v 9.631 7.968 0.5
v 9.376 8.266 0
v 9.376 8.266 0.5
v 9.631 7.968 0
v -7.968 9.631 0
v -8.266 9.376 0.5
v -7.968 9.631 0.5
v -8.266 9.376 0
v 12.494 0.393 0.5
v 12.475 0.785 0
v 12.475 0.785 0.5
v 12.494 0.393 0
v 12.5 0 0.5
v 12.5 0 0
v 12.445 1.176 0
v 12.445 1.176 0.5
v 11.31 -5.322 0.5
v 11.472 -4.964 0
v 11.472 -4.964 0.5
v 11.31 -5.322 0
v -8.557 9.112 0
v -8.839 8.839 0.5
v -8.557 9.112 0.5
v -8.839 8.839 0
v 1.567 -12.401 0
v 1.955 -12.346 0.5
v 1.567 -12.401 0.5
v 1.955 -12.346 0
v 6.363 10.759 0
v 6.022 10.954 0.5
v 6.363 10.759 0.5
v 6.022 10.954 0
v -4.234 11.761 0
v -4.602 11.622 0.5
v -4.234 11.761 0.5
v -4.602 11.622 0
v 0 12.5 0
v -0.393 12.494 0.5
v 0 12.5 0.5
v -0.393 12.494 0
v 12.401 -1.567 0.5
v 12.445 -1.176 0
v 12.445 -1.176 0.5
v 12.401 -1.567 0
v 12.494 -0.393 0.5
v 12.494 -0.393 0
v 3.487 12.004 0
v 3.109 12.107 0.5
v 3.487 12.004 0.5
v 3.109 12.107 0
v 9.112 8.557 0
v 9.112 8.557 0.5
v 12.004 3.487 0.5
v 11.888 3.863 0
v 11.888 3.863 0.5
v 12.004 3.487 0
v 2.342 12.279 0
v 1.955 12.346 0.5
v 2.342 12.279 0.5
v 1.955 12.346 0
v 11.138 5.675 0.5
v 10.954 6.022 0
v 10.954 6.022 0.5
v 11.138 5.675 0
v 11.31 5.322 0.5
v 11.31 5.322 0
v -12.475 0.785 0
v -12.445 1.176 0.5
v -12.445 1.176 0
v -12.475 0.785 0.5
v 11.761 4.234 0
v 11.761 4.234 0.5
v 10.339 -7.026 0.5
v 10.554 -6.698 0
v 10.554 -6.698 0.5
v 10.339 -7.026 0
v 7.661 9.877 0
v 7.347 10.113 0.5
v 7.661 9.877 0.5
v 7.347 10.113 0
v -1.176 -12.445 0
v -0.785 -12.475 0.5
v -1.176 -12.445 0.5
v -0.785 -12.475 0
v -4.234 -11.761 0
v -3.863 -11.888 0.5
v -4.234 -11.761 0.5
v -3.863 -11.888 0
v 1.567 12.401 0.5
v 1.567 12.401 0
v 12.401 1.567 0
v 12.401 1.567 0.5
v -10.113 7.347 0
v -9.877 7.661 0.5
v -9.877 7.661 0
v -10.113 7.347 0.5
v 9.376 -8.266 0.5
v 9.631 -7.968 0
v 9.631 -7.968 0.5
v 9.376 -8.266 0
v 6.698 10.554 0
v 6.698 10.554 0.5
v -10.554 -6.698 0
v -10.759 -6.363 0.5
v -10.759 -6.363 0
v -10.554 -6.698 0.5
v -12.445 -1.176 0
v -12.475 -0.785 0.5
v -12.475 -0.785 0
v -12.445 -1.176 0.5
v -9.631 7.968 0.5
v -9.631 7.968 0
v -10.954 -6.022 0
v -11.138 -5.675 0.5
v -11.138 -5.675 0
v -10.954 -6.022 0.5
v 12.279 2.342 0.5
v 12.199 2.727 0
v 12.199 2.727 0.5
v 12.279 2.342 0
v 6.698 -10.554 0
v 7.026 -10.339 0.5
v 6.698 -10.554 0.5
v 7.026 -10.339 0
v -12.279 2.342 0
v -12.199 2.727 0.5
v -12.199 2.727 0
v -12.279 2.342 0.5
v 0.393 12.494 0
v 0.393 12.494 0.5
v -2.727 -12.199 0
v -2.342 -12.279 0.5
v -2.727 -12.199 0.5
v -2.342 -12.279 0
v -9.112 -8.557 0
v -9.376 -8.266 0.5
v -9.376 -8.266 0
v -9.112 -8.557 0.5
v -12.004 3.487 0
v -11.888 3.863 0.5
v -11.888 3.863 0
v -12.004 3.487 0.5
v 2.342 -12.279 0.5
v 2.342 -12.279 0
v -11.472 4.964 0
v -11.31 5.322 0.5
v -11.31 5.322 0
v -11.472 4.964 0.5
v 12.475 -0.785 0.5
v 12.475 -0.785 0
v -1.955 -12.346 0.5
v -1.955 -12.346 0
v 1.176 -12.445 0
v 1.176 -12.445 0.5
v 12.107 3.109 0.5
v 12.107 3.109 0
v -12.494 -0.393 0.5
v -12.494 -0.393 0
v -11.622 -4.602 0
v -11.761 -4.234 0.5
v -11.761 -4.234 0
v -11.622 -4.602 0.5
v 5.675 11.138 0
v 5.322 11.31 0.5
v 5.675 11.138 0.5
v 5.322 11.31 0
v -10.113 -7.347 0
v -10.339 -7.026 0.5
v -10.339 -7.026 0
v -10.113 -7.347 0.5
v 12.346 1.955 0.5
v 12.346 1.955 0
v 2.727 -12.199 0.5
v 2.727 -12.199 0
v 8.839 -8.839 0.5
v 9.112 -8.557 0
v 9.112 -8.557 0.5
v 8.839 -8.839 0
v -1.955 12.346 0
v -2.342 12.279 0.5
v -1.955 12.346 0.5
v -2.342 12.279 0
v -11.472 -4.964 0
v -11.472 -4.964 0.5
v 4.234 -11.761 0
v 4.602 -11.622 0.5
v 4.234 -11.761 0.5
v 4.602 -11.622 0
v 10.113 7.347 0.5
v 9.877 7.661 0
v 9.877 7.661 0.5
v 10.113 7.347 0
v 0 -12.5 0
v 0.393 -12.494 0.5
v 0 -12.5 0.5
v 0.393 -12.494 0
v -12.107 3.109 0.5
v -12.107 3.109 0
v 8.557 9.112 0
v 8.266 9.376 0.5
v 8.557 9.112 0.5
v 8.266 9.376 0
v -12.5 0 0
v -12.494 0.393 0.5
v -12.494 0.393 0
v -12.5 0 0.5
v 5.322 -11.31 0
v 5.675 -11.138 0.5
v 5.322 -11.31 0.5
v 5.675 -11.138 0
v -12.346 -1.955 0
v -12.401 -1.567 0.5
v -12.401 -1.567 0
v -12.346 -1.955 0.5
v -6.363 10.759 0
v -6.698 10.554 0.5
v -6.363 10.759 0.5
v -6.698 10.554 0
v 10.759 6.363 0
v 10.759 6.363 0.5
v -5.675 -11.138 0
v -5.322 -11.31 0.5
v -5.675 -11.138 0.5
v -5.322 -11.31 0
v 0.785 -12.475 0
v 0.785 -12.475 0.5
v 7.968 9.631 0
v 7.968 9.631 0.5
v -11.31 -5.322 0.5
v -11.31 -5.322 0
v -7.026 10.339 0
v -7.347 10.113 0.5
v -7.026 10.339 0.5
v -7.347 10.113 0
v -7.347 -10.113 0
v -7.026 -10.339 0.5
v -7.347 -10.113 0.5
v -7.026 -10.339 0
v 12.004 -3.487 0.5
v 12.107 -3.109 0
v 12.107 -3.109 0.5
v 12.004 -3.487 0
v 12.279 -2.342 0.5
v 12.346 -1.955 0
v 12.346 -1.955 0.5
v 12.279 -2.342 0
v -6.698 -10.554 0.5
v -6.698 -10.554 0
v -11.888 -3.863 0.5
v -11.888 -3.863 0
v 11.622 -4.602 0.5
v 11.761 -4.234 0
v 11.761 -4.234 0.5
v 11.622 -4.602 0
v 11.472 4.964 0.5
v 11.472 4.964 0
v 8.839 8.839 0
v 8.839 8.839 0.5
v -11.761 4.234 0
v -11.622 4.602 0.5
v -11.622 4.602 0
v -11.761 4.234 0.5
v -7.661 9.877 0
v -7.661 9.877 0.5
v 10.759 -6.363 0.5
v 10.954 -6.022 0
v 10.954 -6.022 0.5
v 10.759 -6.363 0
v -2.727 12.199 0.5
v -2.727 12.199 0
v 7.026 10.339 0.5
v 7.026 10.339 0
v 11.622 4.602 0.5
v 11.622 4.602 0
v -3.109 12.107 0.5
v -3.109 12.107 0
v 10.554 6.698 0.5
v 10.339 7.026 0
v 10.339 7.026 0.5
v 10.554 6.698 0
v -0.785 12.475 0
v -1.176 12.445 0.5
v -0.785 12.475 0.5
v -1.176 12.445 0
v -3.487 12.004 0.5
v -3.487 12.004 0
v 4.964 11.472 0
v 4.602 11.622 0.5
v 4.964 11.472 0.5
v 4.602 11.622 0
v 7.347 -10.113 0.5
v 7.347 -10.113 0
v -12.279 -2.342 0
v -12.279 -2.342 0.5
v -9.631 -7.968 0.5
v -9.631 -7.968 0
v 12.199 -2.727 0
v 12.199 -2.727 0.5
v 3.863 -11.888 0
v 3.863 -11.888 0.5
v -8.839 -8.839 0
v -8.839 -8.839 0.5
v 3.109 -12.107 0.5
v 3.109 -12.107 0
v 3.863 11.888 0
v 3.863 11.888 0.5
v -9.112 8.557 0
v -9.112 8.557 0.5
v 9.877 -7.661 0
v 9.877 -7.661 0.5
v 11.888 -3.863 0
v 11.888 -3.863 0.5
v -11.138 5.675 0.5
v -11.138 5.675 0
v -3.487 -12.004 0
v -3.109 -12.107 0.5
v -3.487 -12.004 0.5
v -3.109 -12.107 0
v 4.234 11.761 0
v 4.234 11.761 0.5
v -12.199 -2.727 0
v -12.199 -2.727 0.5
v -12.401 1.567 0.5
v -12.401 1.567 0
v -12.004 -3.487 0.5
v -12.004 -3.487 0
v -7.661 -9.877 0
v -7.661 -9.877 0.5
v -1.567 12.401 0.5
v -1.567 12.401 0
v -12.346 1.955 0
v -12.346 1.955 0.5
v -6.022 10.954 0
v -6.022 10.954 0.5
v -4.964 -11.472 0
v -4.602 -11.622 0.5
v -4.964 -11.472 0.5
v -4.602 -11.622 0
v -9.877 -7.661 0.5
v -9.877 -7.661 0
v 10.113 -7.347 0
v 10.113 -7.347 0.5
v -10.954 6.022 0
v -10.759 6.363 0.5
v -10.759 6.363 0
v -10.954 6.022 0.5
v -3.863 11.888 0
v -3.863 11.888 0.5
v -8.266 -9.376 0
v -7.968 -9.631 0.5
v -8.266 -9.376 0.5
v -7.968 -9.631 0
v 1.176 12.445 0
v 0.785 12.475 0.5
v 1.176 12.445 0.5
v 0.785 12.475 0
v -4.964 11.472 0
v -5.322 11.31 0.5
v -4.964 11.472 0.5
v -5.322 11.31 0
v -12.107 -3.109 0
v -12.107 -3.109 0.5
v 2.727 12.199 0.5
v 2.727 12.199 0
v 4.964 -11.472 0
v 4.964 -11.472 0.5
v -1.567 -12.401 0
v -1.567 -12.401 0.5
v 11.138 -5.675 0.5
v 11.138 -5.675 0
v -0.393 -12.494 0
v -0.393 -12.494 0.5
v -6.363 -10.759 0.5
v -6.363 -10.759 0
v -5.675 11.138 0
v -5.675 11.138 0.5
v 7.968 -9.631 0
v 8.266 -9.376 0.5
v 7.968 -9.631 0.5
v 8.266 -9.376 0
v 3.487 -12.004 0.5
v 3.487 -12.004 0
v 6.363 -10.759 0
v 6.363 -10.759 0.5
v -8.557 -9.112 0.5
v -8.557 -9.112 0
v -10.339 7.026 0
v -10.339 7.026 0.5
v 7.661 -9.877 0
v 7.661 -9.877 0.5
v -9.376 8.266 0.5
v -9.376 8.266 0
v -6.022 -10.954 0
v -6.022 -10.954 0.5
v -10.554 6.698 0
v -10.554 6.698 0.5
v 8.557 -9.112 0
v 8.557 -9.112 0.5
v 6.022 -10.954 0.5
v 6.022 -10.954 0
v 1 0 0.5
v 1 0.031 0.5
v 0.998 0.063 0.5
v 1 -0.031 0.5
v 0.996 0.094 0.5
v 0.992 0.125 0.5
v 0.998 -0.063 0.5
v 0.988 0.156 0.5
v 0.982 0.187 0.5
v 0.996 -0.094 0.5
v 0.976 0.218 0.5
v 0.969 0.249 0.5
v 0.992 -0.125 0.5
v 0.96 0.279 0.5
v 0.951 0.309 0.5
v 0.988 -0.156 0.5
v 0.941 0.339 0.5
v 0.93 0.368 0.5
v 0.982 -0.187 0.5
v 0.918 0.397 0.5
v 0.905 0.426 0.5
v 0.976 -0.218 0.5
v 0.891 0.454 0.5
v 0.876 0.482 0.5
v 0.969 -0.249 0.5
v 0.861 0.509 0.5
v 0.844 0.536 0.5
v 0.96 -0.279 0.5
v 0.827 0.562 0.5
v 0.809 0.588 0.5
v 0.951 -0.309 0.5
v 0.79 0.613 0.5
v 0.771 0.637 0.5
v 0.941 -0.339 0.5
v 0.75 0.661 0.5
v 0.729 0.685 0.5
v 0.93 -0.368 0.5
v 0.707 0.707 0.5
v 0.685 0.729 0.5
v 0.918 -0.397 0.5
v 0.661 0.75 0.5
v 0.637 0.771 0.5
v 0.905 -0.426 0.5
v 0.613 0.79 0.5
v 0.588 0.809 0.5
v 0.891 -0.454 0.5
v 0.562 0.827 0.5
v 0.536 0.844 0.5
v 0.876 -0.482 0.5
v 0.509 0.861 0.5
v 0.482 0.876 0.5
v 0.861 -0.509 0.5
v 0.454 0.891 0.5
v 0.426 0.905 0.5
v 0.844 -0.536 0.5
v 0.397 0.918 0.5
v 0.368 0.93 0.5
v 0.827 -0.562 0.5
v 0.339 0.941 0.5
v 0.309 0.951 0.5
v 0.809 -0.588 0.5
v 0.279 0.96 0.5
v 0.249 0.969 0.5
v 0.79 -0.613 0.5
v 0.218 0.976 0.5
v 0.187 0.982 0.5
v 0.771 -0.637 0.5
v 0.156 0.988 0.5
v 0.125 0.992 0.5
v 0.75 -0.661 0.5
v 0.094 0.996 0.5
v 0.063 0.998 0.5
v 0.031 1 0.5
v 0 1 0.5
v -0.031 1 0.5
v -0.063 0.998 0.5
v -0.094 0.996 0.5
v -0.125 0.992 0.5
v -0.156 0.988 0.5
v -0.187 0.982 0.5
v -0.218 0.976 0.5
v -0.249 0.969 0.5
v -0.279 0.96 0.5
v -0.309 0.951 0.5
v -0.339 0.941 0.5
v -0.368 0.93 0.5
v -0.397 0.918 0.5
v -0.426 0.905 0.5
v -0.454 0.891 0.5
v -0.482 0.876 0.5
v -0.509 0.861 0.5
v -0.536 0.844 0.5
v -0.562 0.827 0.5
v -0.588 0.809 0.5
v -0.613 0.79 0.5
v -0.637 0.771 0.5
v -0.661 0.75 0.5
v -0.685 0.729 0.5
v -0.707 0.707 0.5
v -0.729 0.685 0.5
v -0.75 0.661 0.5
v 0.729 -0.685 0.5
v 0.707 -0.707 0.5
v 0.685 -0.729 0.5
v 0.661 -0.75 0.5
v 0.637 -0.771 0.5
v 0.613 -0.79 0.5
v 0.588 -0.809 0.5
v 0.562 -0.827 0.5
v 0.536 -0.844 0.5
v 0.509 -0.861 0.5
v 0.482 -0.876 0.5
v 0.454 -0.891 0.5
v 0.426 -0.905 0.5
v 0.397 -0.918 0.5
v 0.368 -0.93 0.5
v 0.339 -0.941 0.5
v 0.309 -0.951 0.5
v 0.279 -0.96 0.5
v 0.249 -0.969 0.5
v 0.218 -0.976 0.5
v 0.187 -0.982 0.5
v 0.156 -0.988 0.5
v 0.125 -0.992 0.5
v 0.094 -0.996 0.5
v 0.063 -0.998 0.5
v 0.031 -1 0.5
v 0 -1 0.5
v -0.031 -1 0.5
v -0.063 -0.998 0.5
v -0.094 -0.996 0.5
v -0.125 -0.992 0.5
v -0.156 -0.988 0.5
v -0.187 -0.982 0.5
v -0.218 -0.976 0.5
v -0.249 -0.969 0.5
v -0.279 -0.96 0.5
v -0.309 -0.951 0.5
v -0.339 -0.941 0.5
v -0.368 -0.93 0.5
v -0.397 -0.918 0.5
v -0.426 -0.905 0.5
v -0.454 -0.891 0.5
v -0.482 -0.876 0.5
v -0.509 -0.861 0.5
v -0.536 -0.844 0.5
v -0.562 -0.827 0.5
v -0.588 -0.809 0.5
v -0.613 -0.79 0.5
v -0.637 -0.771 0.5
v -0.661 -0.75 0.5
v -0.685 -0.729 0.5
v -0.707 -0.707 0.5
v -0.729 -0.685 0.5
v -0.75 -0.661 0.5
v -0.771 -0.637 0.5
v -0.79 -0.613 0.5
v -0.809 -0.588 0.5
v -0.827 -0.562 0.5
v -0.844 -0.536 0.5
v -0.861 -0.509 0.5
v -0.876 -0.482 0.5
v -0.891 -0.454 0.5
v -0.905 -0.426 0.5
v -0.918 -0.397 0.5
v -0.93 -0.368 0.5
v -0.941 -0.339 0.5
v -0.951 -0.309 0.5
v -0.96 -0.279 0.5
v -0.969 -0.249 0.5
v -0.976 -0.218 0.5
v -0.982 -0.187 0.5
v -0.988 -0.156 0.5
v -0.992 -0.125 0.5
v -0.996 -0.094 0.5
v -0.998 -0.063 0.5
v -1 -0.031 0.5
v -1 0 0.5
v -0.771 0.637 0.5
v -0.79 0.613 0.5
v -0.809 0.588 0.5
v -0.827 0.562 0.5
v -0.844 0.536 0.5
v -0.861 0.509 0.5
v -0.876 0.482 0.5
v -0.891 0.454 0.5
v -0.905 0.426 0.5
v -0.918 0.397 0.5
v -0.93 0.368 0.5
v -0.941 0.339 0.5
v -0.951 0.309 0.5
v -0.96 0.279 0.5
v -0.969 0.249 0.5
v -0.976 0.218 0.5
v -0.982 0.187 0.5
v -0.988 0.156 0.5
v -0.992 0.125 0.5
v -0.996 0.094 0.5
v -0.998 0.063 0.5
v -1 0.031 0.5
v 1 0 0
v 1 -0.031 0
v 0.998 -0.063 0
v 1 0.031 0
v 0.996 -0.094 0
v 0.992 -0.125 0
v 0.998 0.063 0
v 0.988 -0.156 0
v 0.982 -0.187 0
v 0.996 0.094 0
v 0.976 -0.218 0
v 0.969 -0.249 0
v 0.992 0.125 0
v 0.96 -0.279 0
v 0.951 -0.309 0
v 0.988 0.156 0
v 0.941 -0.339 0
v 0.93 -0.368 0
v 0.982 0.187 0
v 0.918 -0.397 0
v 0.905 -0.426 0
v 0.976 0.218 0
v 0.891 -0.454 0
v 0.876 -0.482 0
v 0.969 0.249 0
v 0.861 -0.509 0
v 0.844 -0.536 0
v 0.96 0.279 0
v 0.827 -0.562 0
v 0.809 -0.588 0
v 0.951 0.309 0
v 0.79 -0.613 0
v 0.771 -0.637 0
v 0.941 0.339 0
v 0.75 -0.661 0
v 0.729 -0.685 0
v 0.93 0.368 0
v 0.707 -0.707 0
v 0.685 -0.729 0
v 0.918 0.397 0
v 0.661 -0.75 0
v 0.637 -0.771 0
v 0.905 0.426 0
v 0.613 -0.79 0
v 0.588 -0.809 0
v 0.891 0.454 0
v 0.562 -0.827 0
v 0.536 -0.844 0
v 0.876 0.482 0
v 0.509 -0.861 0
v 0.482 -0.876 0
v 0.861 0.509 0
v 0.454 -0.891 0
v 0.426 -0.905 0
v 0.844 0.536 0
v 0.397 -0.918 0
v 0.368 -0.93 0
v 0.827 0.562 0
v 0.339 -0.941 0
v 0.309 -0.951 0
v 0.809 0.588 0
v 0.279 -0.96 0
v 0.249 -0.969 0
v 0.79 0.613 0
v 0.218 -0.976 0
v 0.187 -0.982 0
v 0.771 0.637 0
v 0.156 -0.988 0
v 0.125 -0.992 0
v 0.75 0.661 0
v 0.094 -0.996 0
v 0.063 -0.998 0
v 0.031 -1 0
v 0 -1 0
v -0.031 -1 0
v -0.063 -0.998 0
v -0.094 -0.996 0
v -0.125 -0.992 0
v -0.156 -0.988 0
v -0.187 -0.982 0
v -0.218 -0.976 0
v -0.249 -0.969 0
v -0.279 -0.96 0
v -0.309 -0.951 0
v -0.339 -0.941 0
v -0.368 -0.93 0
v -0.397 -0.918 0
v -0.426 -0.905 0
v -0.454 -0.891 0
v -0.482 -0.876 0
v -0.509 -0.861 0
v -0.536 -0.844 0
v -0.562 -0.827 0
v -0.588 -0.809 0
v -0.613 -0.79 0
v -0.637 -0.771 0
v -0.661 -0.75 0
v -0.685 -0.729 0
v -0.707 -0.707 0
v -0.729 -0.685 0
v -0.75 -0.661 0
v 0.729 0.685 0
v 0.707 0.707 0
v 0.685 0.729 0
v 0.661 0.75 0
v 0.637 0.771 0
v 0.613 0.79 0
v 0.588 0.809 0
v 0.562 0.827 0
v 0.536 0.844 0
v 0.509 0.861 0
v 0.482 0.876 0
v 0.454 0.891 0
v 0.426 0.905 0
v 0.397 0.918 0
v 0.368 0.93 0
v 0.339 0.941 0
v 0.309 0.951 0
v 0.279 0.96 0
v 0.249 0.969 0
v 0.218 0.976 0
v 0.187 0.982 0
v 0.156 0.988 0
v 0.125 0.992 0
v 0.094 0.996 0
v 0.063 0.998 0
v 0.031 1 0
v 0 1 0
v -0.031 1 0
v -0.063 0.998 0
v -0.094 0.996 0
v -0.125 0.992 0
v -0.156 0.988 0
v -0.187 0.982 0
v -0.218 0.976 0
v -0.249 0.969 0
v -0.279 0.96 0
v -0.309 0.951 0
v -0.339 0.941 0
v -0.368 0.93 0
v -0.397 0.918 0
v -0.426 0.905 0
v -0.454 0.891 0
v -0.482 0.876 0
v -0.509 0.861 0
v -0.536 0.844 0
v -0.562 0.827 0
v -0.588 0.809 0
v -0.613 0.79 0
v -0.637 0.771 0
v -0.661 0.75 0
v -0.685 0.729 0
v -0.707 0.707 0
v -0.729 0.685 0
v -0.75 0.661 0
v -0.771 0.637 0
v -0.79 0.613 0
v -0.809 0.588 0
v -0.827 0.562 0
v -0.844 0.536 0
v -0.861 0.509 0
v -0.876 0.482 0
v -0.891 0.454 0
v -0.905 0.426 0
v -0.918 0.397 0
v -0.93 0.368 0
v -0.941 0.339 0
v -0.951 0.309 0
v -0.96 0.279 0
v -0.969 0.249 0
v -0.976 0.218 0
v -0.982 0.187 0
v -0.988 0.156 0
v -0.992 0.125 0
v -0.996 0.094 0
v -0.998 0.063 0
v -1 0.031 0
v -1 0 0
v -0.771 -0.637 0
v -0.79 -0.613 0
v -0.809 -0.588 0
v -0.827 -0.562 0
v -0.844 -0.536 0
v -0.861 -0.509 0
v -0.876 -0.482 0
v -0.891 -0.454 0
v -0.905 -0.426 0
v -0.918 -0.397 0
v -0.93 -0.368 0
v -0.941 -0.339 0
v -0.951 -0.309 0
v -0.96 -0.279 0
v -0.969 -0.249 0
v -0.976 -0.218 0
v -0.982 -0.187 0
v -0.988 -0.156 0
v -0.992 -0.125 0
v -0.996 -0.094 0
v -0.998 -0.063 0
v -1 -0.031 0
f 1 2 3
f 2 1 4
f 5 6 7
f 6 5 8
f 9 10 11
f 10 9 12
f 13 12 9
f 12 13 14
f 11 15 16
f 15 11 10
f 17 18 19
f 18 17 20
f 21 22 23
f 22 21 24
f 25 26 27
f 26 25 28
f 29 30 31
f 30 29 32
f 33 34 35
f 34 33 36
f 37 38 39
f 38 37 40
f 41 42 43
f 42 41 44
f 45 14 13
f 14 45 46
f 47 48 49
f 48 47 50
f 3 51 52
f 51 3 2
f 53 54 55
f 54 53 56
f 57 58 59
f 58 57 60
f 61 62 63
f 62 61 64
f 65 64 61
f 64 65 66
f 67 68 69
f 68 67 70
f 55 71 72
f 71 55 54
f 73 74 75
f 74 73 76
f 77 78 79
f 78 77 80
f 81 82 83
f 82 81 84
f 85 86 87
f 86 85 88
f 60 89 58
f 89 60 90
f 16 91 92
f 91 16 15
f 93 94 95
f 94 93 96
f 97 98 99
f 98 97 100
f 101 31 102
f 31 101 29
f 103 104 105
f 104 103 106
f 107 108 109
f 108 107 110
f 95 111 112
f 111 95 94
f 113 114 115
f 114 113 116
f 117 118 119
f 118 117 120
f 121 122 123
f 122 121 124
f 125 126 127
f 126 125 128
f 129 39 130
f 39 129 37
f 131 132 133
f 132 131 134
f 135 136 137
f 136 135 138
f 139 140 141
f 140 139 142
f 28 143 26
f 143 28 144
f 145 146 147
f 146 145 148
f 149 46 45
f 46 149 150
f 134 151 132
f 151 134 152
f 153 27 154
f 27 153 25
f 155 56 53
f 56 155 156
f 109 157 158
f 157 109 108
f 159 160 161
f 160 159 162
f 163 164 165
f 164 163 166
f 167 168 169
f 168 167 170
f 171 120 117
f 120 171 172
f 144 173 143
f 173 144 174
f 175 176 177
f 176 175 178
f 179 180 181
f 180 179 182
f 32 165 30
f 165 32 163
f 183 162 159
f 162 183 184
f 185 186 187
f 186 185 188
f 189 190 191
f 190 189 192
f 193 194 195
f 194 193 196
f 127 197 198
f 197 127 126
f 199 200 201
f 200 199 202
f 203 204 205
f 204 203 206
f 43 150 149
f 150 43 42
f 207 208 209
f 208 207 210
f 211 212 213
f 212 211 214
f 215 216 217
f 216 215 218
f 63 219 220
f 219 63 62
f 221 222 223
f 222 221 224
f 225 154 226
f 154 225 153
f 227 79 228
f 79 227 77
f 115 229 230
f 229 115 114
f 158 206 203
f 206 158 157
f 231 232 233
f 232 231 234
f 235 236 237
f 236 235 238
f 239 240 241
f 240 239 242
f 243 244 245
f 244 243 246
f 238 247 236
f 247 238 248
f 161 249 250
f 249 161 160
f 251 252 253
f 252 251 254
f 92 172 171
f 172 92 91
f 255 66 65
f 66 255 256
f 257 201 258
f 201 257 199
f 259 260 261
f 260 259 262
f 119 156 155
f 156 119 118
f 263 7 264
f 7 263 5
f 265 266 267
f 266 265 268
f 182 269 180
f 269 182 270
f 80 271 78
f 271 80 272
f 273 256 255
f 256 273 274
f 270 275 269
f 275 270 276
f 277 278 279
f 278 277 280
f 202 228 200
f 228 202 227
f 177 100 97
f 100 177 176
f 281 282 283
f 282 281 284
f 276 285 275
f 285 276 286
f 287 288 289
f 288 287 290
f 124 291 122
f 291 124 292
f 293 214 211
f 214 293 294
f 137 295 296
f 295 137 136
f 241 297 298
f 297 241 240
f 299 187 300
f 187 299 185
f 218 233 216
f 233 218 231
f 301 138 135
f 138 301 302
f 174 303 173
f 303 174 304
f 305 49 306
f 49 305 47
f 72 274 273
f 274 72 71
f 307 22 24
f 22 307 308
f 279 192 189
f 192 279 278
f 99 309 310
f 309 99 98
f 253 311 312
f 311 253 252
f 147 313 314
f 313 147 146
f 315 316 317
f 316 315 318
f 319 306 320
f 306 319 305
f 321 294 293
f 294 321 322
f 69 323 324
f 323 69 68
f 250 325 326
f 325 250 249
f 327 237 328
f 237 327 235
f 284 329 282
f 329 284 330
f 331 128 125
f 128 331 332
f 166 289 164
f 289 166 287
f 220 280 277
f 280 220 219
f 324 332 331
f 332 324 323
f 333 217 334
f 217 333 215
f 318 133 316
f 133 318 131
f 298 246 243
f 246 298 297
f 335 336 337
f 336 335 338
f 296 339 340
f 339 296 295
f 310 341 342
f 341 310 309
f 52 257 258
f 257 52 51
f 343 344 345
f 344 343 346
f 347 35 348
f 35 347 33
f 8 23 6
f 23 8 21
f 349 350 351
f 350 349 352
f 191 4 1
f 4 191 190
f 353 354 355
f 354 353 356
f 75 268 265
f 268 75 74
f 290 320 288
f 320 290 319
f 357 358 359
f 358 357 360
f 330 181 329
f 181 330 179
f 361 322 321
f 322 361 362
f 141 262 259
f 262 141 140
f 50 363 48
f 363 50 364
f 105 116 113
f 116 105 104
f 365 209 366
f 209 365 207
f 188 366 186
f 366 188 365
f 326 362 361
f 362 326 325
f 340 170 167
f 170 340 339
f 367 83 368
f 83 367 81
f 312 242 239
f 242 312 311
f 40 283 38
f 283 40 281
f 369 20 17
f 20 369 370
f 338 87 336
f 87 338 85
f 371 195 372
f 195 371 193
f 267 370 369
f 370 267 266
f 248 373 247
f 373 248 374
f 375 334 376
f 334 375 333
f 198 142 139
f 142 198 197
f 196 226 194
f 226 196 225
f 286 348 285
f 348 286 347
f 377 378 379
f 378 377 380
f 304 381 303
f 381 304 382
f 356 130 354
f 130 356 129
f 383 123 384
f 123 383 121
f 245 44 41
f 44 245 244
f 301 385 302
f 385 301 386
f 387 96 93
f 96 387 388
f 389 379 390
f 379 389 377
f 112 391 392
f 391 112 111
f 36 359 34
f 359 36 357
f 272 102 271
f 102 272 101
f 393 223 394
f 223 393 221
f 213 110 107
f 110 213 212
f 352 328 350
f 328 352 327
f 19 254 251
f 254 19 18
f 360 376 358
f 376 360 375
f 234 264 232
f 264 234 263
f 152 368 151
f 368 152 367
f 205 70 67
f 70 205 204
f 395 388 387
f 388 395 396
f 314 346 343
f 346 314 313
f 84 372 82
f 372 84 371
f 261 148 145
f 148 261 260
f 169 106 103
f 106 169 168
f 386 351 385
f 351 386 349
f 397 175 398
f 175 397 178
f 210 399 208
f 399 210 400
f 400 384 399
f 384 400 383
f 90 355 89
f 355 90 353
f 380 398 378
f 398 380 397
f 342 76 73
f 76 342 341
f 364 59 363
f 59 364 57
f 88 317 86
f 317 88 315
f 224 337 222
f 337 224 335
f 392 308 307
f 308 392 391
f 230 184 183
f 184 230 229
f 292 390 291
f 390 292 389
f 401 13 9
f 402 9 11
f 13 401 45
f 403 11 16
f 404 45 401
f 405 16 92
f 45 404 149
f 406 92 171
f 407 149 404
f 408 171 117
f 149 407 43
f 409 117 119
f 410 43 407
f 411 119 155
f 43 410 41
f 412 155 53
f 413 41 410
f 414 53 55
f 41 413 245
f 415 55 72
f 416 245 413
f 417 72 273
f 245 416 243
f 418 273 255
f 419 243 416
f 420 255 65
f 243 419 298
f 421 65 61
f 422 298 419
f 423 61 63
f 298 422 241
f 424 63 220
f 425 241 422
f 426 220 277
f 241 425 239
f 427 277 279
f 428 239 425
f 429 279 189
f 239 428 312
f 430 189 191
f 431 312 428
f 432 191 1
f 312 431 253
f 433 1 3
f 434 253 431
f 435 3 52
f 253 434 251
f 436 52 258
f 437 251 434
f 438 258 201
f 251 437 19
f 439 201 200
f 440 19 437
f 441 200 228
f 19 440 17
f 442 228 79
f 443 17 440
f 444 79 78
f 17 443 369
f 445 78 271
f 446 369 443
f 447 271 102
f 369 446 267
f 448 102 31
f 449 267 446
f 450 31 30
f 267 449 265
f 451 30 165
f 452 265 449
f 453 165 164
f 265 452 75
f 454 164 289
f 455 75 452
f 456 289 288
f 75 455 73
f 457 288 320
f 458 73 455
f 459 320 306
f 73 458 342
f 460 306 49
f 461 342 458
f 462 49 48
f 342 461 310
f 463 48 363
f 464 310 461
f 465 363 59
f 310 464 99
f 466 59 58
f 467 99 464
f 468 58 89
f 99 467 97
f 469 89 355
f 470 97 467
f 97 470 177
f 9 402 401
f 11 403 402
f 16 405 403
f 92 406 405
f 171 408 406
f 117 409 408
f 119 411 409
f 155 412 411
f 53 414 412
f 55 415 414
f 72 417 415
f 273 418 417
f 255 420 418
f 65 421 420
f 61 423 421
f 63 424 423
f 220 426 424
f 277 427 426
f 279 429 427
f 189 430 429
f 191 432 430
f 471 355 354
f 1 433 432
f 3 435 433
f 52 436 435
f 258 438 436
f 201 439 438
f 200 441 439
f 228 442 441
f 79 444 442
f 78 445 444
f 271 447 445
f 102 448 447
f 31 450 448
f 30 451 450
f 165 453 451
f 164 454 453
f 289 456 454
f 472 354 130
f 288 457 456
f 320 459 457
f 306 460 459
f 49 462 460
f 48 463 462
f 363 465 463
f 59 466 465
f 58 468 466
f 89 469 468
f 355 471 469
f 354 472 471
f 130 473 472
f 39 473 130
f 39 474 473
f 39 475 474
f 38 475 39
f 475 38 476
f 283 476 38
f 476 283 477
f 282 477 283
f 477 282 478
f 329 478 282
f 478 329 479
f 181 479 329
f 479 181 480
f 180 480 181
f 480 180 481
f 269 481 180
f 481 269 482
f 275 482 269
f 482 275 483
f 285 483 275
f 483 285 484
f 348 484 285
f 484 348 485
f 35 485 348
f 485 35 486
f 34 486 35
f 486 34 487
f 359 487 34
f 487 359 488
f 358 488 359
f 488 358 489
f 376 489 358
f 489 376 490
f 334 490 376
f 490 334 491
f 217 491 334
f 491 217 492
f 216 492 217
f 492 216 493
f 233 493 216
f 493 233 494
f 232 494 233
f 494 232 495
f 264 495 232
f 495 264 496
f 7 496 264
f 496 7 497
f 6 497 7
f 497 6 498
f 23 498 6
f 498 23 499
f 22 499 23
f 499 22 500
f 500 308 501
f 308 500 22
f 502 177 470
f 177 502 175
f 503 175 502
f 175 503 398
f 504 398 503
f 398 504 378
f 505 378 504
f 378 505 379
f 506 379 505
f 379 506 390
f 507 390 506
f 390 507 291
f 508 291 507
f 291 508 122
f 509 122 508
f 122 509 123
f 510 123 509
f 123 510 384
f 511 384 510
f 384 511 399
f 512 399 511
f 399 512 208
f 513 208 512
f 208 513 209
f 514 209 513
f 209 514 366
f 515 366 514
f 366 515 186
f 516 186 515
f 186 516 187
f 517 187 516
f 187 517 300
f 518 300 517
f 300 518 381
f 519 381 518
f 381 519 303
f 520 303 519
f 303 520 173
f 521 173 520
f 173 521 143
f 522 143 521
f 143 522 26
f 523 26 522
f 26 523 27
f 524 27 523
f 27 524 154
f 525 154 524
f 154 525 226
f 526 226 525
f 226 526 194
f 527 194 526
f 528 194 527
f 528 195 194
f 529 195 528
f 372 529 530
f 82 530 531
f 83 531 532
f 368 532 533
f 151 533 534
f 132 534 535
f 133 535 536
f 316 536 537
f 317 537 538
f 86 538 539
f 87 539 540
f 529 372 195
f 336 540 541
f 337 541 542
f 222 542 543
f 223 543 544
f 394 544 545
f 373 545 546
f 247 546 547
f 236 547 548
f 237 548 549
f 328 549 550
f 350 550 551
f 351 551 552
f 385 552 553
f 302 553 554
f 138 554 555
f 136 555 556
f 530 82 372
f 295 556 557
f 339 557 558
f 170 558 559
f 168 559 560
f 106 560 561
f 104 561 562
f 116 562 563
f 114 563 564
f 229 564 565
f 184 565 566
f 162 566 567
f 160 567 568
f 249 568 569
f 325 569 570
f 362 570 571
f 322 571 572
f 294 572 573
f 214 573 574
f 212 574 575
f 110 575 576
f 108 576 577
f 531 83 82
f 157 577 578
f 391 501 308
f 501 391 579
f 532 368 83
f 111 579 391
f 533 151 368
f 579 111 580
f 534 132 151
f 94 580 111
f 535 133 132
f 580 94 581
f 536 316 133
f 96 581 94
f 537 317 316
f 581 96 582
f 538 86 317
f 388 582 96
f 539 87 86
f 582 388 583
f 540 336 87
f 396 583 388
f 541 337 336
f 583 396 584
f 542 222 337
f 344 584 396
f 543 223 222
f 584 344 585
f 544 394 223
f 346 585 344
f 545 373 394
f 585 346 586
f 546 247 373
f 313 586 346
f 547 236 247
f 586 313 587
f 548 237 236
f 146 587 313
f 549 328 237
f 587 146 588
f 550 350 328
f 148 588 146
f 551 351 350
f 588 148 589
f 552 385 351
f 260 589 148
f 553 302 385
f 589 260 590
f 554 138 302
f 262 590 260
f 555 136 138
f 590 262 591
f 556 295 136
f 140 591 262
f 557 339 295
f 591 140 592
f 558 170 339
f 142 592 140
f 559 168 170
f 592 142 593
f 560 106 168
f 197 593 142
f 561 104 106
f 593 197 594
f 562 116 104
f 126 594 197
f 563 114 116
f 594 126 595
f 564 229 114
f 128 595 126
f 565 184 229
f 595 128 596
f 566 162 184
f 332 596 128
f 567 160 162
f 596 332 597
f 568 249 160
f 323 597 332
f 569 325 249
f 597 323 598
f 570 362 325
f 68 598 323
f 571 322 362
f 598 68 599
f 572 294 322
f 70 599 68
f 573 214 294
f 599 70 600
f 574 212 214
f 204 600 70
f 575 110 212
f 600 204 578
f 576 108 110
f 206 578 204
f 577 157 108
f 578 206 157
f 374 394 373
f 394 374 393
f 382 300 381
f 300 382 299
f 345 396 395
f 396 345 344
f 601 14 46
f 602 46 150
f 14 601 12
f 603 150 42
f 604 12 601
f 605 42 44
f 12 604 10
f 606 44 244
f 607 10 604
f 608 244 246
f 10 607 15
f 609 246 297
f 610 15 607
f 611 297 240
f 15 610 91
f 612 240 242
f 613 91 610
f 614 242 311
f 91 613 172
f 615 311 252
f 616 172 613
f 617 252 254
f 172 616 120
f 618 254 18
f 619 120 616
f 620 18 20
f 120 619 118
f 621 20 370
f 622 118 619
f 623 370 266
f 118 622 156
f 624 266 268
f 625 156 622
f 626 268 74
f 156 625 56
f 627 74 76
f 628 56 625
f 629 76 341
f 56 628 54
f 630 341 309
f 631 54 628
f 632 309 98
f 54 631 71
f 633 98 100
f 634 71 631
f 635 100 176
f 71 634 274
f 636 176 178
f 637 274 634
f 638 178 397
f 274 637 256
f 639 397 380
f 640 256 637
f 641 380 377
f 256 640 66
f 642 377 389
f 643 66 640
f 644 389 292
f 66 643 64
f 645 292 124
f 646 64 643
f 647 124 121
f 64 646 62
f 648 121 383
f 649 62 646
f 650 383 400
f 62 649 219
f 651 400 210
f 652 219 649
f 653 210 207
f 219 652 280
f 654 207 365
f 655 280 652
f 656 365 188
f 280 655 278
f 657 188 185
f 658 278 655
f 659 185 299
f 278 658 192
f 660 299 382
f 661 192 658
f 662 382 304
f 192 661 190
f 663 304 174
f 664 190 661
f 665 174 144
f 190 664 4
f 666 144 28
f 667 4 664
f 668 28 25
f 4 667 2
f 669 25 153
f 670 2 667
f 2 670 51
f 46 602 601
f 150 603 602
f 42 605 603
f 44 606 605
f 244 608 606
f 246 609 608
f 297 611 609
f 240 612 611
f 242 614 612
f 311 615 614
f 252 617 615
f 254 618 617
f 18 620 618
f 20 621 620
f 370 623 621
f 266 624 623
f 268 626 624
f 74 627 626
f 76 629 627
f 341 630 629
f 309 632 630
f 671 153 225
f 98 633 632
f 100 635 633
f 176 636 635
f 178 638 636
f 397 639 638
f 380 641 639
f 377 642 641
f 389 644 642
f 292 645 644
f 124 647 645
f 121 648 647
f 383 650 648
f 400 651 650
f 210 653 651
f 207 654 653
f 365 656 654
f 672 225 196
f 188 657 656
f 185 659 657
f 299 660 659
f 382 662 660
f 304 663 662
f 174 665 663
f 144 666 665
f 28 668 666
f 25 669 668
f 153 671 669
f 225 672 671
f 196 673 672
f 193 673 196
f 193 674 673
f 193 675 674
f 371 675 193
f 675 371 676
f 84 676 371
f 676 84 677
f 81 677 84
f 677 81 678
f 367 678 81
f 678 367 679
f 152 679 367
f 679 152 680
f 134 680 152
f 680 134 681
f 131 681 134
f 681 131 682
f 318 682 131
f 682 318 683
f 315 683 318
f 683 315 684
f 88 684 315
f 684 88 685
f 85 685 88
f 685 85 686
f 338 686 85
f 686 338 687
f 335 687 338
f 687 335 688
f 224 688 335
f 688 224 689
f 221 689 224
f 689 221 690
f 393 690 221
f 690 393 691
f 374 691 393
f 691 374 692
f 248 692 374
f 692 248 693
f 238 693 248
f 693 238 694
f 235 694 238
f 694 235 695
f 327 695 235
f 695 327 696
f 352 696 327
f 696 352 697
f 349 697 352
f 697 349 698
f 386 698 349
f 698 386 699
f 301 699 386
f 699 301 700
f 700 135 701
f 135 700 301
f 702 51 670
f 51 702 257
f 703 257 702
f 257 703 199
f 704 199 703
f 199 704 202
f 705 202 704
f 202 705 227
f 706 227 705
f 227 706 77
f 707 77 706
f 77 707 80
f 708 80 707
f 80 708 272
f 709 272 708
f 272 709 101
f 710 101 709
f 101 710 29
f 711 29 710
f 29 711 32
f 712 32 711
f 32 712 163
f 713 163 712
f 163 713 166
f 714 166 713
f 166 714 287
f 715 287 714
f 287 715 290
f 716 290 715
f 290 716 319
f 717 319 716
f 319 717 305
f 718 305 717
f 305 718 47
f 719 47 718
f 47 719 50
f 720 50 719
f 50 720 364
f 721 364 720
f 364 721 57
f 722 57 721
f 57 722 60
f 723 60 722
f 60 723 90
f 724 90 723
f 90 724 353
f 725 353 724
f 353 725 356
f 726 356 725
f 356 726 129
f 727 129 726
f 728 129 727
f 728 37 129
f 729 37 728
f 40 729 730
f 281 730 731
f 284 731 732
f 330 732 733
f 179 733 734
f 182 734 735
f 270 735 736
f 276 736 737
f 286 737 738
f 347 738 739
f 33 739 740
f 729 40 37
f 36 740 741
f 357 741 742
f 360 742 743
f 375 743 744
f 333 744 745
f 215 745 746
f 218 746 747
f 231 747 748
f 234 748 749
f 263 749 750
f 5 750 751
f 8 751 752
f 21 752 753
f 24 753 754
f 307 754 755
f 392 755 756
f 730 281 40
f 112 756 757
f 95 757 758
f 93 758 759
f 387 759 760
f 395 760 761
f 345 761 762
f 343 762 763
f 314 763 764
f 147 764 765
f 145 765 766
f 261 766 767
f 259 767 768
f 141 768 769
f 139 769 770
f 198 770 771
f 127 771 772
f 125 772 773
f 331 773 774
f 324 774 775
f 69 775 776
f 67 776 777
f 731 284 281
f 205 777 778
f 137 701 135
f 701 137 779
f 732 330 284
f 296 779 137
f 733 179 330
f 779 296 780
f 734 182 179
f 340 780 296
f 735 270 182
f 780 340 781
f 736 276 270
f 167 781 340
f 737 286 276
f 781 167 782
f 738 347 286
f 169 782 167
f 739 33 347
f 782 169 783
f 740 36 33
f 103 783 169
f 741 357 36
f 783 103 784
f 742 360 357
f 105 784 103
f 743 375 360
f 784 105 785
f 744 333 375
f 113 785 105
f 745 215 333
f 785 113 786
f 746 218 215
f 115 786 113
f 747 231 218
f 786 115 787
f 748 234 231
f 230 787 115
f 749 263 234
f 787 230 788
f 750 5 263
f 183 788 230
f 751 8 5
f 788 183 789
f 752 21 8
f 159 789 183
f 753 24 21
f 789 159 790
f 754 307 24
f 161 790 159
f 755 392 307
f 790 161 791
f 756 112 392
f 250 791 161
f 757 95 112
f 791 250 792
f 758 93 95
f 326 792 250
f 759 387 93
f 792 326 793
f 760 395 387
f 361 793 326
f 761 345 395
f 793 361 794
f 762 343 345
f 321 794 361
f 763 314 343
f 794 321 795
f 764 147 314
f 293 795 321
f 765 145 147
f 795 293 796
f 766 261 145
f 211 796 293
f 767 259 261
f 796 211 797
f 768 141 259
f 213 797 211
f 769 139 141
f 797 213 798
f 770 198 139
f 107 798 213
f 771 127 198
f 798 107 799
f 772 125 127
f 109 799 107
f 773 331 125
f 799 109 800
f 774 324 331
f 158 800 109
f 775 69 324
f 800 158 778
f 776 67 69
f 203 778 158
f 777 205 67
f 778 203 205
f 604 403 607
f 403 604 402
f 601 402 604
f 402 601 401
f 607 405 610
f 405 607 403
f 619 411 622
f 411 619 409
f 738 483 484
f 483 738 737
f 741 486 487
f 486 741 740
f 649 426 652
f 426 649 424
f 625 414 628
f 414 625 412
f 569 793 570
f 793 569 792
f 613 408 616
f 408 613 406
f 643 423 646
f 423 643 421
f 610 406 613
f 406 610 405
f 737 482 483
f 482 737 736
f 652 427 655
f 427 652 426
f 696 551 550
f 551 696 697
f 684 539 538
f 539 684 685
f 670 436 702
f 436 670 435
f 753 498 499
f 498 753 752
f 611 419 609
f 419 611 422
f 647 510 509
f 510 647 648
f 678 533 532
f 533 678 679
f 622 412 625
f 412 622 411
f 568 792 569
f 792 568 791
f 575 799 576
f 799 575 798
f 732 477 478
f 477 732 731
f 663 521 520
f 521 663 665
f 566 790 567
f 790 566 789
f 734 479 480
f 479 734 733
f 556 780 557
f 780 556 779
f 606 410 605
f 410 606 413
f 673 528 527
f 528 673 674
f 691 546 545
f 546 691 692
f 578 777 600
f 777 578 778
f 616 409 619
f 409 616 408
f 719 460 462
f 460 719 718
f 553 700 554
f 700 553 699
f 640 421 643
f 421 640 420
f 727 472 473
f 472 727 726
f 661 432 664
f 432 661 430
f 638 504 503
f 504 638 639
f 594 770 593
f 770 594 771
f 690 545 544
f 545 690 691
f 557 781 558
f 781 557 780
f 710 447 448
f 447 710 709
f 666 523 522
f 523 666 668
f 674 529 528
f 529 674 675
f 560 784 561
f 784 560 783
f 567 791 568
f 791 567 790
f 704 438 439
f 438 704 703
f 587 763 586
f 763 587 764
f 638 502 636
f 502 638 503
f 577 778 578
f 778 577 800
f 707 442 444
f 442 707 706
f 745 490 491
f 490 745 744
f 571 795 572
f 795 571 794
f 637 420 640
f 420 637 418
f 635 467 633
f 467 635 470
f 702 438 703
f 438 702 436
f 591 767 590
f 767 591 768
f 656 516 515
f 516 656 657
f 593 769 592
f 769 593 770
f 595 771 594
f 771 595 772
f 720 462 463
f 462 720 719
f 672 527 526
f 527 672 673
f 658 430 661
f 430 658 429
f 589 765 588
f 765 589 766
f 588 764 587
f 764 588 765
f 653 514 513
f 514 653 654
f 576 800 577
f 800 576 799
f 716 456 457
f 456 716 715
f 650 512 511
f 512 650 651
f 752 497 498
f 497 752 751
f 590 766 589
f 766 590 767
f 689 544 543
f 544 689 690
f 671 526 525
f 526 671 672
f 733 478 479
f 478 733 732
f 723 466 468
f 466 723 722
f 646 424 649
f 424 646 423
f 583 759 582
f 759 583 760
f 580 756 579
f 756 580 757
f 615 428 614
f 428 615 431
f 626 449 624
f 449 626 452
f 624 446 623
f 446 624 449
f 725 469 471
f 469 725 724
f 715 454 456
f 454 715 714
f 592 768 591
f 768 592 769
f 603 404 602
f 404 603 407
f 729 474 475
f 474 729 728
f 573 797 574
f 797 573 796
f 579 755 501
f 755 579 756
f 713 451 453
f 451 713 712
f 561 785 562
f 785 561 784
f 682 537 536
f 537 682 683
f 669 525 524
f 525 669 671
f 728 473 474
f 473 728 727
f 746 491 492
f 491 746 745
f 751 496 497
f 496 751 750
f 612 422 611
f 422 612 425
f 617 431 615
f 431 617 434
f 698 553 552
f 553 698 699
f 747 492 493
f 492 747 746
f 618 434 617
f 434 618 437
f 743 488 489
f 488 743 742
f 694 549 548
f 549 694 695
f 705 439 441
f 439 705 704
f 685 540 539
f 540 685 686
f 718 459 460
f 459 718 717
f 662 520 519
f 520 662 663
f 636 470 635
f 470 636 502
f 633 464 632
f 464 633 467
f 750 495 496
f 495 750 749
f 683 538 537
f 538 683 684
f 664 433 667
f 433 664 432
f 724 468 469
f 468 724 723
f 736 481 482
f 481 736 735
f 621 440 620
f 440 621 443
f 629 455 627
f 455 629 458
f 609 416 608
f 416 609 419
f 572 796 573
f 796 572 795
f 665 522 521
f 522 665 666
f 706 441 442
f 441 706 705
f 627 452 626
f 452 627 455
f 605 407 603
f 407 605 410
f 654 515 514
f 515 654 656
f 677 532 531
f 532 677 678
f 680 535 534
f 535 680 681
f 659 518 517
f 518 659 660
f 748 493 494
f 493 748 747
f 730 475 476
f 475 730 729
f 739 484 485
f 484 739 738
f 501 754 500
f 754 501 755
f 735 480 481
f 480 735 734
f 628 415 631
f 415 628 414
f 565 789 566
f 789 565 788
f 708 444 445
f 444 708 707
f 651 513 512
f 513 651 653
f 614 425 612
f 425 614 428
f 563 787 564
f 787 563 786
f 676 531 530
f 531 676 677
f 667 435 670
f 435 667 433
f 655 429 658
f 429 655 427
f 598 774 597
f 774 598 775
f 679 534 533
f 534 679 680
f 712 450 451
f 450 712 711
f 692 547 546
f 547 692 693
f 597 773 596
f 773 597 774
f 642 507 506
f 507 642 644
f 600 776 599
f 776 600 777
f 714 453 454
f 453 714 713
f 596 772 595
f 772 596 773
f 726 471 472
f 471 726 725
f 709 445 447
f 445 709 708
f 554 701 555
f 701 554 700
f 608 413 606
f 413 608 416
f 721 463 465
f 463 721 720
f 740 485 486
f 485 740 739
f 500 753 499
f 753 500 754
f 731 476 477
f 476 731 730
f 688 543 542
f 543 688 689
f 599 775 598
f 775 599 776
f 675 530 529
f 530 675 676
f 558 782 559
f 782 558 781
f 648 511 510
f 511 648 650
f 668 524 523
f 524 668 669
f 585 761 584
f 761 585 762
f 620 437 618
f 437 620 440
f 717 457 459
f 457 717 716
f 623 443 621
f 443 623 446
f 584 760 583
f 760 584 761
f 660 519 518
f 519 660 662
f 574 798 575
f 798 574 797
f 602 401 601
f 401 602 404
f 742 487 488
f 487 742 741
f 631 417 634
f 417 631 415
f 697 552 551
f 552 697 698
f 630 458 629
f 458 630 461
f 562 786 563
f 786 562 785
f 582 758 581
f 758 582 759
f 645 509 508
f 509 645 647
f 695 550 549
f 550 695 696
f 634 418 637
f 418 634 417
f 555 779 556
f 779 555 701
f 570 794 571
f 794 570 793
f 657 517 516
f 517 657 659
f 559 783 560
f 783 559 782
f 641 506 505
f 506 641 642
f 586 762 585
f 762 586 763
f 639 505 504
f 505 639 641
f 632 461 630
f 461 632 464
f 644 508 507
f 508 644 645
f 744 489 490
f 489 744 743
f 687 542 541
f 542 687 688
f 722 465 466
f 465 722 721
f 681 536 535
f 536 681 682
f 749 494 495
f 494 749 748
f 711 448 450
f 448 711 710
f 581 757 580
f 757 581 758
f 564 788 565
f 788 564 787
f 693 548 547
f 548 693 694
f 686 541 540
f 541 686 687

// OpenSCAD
//==============================
// Parametric Single Pinhole Disc
// For SLA Printing
// Units: mm
//==============================

// PARAMETERS
disc_diameter = 25;      // Overall disc diameter
disc_thickness = 0.50;   // Disc thickness
hole_diameter = 2.00;    // Central pinhole

$fn = 200;               // Smooth circles

difference() {

    // Disc
    cylinder(
        d = disc_diameter,
        h = disc_thickness,
        center = false
    );

    // Pinhole
    translate([0,0,-1])
        cylinder(
            d = hole_diameter,
            h = disc_thickness + 2
        );

}
